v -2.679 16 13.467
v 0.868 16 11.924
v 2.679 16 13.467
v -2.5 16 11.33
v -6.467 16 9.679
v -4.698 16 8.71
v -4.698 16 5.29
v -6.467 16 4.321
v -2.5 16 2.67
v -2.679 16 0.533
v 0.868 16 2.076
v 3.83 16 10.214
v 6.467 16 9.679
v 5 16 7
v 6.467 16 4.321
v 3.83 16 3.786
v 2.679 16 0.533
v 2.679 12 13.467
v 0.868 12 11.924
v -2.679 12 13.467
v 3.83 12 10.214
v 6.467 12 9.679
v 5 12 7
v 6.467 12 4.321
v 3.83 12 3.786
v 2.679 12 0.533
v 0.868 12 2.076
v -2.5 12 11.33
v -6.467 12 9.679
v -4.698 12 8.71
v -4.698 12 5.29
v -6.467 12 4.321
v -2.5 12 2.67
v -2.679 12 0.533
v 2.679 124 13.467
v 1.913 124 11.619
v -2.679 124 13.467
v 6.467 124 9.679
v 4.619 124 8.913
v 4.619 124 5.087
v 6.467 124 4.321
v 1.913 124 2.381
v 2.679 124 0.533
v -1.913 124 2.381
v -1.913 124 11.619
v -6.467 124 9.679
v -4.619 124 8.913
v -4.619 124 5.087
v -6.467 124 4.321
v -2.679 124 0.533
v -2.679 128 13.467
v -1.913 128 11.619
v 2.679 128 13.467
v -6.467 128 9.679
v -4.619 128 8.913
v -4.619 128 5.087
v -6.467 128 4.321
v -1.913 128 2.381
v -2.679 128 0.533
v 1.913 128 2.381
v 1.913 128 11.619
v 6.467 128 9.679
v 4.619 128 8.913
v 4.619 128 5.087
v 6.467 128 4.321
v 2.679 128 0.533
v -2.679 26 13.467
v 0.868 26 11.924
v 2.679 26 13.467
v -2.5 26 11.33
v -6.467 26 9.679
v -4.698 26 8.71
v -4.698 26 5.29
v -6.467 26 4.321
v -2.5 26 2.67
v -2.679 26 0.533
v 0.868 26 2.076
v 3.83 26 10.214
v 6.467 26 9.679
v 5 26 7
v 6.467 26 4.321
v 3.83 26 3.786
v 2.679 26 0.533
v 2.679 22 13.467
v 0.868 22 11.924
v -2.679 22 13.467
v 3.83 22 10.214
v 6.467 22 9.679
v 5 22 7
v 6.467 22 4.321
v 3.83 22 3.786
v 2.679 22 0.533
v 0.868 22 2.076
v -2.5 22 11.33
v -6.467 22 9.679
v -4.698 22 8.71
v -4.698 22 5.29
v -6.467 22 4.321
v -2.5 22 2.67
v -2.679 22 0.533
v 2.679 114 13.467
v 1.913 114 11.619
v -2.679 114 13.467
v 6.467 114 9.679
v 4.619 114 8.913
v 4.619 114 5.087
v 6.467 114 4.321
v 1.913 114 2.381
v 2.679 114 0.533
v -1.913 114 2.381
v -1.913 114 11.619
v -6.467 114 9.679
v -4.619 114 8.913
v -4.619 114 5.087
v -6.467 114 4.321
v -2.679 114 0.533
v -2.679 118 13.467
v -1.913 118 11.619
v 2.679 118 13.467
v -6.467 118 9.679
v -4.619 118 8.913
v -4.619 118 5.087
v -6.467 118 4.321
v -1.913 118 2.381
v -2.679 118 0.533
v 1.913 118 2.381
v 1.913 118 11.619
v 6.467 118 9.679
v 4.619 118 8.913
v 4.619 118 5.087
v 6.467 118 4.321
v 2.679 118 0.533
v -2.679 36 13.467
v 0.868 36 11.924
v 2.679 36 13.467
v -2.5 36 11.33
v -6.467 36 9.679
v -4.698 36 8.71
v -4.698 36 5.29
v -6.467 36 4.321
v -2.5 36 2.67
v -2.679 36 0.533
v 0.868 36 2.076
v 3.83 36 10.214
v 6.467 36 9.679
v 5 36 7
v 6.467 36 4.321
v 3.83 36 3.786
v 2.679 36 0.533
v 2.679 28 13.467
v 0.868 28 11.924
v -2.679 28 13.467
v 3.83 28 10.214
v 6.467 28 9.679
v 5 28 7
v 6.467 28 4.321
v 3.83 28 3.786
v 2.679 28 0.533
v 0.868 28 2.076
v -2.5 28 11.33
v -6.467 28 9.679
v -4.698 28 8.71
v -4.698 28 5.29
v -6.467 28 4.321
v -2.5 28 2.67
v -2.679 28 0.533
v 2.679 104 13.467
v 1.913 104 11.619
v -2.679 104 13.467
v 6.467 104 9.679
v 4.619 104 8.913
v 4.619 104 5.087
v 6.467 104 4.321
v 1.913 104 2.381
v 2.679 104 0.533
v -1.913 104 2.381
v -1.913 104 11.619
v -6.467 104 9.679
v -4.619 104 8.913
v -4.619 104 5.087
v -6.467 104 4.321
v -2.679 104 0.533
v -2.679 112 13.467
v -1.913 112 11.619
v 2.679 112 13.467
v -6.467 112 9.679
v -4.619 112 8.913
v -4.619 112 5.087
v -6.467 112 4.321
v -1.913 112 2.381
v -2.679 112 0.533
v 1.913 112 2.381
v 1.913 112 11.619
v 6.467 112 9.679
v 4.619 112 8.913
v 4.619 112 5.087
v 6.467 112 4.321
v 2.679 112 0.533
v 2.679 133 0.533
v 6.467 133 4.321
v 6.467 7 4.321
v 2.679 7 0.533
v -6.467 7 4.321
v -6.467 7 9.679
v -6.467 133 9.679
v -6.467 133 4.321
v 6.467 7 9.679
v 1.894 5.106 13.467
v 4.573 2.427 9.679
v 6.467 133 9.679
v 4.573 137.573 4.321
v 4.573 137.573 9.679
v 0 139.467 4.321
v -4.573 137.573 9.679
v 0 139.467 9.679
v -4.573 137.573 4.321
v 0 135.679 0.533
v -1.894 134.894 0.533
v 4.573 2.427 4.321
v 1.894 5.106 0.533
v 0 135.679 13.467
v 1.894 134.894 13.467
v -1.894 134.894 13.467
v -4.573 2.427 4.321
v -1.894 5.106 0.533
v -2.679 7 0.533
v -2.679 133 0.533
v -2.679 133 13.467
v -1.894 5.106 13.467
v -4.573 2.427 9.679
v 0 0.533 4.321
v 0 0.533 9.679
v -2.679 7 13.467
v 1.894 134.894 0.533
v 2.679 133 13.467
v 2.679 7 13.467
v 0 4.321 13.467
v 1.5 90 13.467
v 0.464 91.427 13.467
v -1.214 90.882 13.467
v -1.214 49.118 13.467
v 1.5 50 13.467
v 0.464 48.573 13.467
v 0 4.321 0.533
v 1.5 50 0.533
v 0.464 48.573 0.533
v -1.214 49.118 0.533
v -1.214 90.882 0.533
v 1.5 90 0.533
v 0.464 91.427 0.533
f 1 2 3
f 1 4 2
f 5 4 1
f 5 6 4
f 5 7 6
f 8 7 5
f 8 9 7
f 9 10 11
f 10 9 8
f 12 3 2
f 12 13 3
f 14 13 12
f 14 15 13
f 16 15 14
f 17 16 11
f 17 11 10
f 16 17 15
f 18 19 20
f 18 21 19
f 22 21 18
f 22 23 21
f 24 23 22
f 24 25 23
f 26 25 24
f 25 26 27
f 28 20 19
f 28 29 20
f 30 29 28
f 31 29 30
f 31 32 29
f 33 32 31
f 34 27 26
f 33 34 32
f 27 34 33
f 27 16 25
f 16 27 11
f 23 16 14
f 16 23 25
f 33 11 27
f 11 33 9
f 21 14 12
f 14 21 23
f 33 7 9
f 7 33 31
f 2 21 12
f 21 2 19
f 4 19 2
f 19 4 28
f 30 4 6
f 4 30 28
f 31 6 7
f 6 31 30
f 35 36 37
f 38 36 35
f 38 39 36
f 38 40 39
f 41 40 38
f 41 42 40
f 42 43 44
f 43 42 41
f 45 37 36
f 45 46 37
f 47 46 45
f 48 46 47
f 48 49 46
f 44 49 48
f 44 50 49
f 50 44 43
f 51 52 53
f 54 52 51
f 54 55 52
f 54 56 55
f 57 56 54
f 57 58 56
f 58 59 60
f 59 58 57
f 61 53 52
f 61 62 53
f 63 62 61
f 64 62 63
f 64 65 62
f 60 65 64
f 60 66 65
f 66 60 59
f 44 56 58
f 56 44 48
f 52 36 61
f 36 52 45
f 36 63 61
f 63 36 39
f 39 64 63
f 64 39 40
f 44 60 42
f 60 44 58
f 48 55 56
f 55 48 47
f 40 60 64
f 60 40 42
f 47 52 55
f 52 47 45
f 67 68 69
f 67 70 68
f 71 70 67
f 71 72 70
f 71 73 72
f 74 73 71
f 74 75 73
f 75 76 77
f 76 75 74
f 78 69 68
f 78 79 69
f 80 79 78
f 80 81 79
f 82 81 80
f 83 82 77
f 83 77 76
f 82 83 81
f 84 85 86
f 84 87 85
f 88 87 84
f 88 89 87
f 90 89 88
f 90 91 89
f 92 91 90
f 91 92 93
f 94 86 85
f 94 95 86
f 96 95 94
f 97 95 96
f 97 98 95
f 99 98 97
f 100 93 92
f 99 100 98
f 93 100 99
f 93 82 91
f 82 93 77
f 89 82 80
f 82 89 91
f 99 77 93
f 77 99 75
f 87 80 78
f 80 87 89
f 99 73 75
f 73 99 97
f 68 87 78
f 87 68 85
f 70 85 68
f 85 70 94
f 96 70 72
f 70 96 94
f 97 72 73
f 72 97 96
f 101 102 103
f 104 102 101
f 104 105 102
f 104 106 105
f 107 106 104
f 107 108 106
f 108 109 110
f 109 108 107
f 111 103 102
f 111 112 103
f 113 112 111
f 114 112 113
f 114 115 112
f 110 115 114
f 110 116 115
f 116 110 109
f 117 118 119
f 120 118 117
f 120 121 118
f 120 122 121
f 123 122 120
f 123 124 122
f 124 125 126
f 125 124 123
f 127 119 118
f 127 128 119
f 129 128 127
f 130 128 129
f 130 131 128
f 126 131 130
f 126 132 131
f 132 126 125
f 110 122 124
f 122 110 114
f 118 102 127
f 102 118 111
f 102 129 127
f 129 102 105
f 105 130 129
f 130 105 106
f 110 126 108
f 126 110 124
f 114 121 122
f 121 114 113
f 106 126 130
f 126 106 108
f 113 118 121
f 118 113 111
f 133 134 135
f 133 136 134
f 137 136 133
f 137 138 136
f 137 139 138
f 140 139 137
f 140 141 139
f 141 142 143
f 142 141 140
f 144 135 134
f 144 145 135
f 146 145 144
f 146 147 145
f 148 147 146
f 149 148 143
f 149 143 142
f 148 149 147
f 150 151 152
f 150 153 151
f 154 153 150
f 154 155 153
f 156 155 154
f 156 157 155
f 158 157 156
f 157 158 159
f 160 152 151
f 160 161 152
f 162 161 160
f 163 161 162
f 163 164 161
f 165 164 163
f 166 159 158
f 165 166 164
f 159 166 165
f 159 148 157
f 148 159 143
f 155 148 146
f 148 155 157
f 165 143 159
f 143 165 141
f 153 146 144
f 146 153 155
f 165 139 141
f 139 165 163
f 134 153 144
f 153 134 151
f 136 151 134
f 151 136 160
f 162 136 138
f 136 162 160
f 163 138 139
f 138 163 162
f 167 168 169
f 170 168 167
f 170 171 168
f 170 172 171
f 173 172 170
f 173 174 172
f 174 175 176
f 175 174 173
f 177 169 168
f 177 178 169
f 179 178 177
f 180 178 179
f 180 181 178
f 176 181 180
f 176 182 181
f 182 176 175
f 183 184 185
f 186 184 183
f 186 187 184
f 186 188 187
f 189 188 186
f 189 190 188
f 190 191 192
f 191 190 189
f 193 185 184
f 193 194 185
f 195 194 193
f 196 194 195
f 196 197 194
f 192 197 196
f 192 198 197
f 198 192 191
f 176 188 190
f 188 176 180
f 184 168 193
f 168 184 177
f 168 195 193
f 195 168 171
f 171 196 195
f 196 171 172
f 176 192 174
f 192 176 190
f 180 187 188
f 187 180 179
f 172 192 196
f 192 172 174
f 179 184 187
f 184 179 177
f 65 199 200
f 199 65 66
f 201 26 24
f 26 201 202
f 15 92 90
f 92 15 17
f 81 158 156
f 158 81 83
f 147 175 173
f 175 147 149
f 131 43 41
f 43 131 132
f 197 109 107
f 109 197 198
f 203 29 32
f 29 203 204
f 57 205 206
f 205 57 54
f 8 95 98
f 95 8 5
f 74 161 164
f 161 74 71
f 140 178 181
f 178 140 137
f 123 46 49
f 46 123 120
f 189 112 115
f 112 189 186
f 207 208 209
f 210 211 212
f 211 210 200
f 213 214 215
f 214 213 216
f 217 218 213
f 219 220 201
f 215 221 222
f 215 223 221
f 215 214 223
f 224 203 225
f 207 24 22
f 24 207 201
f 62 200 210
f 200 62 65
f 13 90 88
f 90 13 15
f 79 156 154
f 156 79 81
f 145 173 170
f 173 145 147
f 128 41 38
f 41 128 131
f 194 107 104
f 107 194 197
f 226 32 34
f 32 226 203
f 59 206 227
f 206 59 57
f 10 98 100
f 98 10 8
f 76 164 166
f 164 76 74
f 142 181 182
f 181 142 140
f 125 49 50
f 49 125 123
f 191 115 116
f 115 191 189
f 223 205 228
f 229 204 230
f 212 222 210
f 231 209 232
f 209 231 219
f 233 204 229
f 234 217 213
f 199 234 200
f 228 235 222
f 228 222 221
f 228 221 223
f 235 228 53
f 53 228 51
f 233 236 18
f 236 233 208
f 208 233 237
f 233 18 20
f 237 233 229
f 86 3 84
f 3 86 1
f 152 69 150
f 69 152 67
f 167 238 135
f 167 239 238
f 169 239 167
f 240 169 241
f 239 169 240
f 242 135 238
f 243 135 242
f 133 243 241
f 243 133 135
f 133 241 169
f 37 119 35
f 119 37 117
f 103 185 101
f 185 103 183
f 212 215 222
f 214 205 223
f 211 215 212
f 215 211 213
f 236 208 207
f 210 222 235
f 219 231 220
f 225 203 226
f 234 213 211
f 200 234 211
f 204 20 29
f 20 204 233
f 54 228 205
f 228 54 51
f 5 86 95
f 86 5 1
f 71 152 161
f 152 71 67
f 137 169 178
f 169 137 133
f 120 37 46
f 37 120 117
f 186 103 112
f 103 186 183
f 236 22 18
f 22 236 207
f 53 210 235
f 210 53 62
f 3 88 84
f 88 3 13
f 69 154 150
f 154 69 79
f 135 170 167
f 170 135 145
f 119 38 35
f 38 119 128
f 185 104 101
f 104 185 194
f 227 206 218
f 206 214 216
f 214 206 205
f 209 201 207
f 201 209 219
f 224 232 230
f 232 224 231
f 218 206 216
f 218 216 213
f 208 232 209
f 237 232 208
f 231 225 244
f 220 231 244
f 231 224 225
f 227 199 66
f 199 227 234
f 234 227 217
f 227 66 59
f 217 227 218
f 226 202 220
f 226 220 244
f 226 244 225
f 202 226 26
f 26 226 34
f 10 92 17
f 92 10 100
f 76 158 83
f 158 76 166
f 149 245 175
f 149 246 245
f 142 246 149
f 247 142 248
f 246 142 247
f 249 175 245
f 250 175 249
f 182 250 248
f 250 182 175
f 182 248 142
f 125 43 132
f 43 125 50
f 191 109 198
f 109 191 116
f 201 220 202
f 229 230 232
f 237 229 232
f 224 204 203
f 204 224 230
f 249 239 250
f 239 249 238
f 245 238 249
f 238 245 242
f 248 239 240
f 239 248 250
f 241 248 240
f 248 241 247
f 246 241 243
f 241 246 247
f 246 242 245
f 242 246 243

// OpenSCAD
// file: variables.scad
// Set variables related to the creation of the rod and
// strap holder. All measurements are in mm

// Variables related to Rod
rod_r=7; //rod radius
rod_l=140; //rod length
rod_g=5; //rod groove radius
rod_res=8; //rod resolution

rod_groove_l=[4,4,8];//
rod_groove_p=[12,22,28];//
rod_groove_array=3;
rod_in_strap_space=2;//spacing between rod and the curve

// Variables realted to strap holder
strap_holder_w=50; // strap holder width
strap_holder_t=1.5; //strap holder thickness
strap_holder_l=90; //strap holder length
holder_w=25; //curved holder width
strap_w=40; //velcro strap width
strap_t=3; //velcro strap groove thickness
curve_sup_t=5; //groove support thichness
curve_t=4; //curve thickness

groov_p_y=[6,15]; //y-position of strap grooves 

groov_array_length=2;//length of grooves y-position array 
curve_op=20;//curve upper openning window width 

// Useful calculations (Do not modify)
groov_p_x=(strap_holder_w-strap_w)/2;

curve_or=rod_r+rod_in_strap_space+curve_t; //curve outer radius
curve_ir=rod_r+rod_in_strap_space; //curve inner radius
window_y_p=(strap_holder_w-curve_op)/2;//y-position of window
// main file
/**
 * Create the rod
 * This section should consist of a rod with a slot to create torque and tighten a tourniquet
 * connected to the base plate
**/
include <variables.scad>;

module rod(){
    difference(){
        hull(){ //the body of the rod
            translate([0,rod_r,rod_r])
            sphere(r=rod_r,$fn=rod_res);
            translate([0,rod_l-rod_r,rod_r])
            sphere(r=rod_r,$fn=rod_res);
        }

    //
        hull(){//cutting the strap entrance slot
            translate([0,(-strap_w+rod_l)/2,0])
            cylinder(r=strap_t/2,h=rod_r*2);
            translate([0,(strap_w+rod_l)/2,0])
            cylinder(r=strap_t/2,h=rod_r*2);
        }
        for(i=[0:1:rod_groove_array-1]){//cutting grooves along the rod,,gets the position of the the groove and the thickness of it and the diameter then cut it as given
            translate([0,rod_groove_p[i],rod_r])
            rotate([-90,0,0])
            rotate([0,0,0])
            difference() {
                cylinder(r=rod_r*2,h=rod_groove_l[i],$fn=rod_res+1);
                cylinder(r=rod_g,h=rod_groove_l[i],$fn=rod_res+1);
            }
            translate([0,rod_l-rod_groove_p[i],rod_r])
            rotate([90,0,0])rotate([0,0,22.5])
            difference() {
                cylinder(r=rod_r+1,h=rod_groove_l[i],$fn=rod_res);
                cylinder(r=rod_g,h=rod_groove_l[i],$fn=rod_res);
            }
        }
    }
}

rod();
